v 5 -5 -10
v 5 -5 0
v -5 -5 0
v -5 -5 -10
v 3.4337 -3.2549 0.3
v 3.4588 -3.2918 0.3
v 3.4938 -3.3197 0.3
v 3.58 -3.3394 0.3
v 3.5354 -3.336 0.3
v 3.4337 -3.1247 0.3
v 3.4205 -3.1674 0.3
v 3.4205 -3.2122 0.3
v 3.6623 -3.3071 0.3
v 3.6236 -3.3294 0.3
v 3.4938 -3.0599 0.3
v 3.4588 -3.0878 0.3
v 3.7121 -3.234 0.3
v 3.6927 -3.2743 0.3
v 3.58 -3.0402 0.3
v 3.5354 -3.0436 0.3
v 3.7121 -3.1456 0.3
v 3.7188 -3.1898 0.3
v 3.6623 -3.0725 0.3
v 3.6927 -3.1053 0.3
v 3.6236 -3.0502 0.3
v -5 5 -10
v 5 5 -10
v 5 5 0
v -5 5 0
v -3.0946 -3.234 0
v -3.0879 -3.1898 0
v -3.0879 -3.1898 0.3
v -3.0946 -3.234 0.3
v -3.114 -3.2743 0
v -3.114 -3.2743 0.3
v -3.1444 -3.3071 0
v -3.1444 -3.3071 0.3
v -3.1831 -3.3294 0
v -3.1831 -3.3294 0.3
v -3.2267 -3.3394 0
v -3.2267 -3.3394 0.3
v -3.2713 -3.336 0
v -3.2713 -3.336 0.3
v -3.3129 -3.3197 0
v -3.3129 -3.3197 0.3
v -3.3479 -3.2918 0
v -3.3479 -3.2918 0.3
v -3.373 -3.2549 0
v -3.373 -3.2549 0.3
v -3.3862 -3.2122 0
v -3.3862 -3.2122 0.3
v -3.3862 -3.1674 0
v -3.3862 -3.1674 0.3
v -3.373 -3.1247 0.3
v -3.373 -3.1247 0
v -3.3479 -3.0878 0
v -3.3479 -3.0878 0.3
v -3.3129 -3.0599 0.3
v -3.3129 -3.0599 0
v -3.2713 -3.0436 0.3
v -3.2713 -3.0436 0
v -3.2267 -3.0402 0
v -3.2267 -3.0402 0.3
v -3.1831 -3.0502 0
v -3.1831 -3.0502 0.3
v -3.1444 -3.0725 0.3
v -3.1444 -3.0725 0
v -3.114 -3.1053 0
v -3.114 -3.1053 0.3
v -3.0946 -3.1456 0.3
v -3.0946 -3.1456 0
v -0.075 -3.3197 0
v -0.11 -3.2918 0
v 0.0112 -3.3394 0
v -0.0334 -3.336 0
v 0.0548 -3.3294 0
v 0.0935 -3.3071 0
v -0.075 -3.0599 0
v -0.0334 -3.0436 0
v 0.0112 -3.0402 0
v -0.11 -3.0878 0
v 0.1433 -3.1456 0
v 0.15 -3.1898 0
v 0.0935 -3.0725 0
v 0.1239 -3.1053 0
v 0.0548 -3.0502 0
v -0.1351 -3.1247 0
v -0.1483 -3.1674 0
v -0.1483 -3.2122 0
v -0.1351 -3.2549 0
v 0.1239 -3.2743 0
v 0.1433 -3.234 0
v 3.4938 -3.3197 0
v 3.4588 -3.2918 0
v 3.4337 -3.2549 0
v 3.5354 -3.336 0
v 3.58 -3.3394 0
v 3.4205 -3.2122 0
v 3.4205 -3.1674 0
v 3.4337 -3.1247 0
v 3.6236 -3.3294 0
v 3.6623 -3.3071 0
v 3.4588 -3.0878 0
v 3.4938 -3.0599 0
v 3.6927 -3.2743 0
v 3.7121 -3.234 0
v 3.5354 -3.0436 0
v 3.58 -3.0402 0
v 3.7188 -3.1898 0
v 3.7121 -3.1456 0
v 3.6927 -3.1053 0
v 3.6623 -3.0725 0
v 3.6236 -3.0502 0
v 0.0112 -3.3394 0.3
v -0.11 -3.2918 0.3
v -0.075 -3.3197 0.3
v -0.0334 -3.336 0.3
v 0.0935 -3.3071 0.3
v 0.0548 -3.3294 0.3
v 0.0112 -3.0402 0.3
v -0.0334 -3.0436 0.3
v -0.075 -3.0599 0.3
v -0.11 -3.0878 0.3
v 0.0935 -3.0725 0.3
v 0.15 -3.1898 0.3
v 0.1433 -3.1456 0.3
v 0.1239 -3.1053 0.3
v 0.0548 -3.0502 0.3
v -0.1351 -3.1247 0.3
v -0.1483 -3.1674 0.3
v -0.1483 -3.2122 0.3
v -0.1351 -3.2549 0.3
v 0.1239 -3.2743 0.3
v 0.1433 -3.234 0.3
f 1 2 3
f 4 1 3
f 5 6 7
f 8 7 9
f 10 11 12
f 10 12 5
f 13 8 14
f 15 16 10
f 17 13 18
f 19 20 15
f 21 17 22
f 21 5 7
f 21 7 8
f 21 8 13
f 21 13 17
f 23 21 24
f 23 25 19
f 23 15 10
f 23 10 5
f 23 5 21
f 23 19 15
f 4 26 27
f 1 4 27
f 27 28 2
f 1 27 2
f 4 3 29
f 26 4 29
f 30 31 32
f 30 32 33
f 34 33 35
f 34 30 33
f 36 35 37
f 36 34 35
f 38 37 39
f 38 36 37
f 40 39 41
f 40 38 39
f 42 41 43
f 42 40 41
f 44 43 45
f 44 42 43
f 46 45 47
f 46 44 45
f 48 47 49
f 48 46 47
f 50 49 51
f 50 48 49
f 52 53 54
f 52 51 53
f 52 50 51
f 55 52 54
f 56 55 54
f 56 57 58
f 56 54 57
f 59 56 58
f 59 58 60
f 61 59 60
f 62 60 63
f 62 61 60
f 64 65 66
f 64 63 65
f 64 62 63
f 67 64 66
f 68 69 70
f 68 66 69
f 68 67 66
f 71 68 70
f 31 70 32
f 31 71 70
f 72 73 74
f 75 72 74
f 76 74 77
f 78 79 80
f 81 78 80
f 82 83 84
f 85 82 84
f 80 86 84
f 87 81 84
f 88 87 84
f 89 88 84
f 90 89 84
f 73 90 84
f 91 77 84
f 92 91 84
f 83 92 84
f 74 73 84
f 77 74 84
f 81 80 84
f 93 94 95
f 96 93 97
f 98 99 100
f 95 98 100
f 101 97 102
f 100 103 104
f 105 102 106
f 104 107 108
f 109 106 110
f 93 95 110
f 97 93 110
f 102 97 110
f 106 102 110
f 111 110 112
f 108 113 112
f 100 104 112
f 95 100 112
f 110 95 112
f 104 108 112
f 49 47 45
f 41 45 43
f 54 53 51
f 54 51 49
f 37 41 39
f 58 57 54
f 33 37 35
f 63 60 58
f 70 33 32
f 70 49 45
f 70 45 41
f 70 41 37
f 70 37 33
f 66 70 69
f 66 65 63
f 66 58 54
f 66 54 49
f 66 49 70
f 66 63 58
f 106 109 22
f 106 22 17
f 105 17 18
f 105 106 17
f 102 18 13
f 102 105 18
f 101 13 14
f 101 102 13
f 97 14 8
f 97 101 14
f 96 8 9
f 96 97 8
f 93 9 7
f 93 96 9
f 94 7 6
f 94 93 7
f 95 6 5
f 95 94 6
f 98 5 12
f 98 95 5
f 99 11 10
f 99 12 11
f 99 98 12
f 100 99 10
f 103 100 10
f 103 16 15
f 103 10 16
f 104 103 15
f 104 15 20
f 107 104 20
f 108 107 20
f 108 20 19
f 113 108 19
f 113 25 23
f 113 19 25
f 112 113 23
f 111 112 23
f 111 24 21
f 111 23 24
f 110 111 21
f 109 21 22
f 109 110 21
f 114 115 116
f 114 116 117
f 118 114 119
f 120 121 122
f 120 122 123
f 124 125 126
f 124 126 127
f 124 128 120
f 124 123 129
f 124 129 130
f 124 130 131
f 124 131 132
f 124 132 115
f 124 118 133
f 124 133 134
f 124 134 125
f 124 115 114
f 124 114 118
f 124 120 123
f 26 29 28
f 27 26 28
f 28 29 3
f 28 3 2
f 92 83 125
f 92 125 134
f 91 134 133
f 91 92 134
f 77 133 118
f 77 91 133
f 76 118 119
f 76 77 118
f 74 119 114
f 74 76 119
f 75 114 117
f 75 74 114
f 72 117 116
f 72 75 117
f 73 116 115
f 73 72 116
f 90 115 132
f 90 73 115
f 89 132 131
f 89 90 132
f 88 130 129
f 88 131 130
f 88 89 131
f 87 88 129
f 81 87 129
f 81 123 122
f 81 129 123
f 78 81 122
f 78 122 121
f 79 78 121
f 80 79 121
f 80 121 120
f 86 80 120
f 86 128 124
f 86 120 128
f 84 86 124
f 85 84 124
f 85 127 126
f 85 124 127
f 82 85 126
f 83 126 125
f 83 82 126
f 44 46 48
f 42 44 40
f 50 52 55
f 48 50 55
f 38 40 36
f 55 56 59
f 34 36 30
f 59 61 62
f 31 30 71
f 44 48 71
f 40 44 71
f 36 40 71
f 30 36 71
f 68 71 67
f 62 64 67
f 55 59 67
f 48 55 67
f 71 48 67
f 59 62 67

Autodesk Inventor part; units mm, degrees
ref_plane "YZ Plane" through (0, 0, 0) normal (1, 0, 0) x (0, 1, 0)
ref_plane "XZ Plane" through (0, 0, 0) normal (0, 1, 0) x (-1, 0, 0)
sketch "Эскиз1" plane through (0, 0, 0) normal (0, 0, 1) x (1, 0, 0)
  line L0 (-5, 5) -> (5, 5)
  line L1 (5, 5) -> (5, -5)
  line L2 (5, -5) -> (-5, -5)
  line L3 (-5, -5) -> (-5, 5)
  point P0 (0, 0)
  point P1 (5, 0)
  point P2 (0, 5)
  dimension "d0" = 10
  dimension "d1" = 10
extrude "Выдавливание1" add sketch "Эскиз1" against normal blind 10
sketch "Эскиз2" plane through (0, 0, 0) normal (0, 0, 1) x (1, 0, 0)
  line L0 (-3.4766, 4.33) -> (6.5107, 4.33) construction
  line L1 (6.5107, 4.33) -> (6.5107, 1.2958) construction
  line L2 (6.5107, 1.2958) -> (-3.4766, 1.2958) construction
  line L3 (-3.4766, 1.2958) -> (-3.4766, 4.33) construction
  point P0 (0, 0)
ref_plane "РабПлоскость1" through (0, 0, 0) normal (0, 0, 1) x (1, 0, 0)
sketch "Эскиз3" plane through (0, 0, 0) normal (0, 0, 1) x (1, 0, 0)
  circle A0 centre (-3.2379, -3.1898) radius 0.15
  point P0 (0, 0)
  dimension "d5" = 0.3
extrude "Выдавливание2" add sketch "Эскиз3" along normal blind 0.3 separate body
sketch "Эскиз4" plane through (0, 0, 0) normal (0, 0, 1) x (1, 0, 0)
  circle A0 centre (0, -3.1898) radius 0.15
  point P0 (0, 0)
  dimension "d10" = 0.3
extrude "Выдавливание3" add sketch "Эскиз4" along normal blind 0.3 separate body
sketch "Эскиз5" plane through (0, 0, 0) normal (0, 0, 1) x (1, 0, 0)
  circle A0 centre (3.5688, -3.1898) radius 0.15
  point P0 (0, 0)
  dimension "d13" = 0.3
extrude "Выдавливание4" add sketch "Эскиз5" along normal blind 0.3 separate body
properties part number "voltage_supply"
